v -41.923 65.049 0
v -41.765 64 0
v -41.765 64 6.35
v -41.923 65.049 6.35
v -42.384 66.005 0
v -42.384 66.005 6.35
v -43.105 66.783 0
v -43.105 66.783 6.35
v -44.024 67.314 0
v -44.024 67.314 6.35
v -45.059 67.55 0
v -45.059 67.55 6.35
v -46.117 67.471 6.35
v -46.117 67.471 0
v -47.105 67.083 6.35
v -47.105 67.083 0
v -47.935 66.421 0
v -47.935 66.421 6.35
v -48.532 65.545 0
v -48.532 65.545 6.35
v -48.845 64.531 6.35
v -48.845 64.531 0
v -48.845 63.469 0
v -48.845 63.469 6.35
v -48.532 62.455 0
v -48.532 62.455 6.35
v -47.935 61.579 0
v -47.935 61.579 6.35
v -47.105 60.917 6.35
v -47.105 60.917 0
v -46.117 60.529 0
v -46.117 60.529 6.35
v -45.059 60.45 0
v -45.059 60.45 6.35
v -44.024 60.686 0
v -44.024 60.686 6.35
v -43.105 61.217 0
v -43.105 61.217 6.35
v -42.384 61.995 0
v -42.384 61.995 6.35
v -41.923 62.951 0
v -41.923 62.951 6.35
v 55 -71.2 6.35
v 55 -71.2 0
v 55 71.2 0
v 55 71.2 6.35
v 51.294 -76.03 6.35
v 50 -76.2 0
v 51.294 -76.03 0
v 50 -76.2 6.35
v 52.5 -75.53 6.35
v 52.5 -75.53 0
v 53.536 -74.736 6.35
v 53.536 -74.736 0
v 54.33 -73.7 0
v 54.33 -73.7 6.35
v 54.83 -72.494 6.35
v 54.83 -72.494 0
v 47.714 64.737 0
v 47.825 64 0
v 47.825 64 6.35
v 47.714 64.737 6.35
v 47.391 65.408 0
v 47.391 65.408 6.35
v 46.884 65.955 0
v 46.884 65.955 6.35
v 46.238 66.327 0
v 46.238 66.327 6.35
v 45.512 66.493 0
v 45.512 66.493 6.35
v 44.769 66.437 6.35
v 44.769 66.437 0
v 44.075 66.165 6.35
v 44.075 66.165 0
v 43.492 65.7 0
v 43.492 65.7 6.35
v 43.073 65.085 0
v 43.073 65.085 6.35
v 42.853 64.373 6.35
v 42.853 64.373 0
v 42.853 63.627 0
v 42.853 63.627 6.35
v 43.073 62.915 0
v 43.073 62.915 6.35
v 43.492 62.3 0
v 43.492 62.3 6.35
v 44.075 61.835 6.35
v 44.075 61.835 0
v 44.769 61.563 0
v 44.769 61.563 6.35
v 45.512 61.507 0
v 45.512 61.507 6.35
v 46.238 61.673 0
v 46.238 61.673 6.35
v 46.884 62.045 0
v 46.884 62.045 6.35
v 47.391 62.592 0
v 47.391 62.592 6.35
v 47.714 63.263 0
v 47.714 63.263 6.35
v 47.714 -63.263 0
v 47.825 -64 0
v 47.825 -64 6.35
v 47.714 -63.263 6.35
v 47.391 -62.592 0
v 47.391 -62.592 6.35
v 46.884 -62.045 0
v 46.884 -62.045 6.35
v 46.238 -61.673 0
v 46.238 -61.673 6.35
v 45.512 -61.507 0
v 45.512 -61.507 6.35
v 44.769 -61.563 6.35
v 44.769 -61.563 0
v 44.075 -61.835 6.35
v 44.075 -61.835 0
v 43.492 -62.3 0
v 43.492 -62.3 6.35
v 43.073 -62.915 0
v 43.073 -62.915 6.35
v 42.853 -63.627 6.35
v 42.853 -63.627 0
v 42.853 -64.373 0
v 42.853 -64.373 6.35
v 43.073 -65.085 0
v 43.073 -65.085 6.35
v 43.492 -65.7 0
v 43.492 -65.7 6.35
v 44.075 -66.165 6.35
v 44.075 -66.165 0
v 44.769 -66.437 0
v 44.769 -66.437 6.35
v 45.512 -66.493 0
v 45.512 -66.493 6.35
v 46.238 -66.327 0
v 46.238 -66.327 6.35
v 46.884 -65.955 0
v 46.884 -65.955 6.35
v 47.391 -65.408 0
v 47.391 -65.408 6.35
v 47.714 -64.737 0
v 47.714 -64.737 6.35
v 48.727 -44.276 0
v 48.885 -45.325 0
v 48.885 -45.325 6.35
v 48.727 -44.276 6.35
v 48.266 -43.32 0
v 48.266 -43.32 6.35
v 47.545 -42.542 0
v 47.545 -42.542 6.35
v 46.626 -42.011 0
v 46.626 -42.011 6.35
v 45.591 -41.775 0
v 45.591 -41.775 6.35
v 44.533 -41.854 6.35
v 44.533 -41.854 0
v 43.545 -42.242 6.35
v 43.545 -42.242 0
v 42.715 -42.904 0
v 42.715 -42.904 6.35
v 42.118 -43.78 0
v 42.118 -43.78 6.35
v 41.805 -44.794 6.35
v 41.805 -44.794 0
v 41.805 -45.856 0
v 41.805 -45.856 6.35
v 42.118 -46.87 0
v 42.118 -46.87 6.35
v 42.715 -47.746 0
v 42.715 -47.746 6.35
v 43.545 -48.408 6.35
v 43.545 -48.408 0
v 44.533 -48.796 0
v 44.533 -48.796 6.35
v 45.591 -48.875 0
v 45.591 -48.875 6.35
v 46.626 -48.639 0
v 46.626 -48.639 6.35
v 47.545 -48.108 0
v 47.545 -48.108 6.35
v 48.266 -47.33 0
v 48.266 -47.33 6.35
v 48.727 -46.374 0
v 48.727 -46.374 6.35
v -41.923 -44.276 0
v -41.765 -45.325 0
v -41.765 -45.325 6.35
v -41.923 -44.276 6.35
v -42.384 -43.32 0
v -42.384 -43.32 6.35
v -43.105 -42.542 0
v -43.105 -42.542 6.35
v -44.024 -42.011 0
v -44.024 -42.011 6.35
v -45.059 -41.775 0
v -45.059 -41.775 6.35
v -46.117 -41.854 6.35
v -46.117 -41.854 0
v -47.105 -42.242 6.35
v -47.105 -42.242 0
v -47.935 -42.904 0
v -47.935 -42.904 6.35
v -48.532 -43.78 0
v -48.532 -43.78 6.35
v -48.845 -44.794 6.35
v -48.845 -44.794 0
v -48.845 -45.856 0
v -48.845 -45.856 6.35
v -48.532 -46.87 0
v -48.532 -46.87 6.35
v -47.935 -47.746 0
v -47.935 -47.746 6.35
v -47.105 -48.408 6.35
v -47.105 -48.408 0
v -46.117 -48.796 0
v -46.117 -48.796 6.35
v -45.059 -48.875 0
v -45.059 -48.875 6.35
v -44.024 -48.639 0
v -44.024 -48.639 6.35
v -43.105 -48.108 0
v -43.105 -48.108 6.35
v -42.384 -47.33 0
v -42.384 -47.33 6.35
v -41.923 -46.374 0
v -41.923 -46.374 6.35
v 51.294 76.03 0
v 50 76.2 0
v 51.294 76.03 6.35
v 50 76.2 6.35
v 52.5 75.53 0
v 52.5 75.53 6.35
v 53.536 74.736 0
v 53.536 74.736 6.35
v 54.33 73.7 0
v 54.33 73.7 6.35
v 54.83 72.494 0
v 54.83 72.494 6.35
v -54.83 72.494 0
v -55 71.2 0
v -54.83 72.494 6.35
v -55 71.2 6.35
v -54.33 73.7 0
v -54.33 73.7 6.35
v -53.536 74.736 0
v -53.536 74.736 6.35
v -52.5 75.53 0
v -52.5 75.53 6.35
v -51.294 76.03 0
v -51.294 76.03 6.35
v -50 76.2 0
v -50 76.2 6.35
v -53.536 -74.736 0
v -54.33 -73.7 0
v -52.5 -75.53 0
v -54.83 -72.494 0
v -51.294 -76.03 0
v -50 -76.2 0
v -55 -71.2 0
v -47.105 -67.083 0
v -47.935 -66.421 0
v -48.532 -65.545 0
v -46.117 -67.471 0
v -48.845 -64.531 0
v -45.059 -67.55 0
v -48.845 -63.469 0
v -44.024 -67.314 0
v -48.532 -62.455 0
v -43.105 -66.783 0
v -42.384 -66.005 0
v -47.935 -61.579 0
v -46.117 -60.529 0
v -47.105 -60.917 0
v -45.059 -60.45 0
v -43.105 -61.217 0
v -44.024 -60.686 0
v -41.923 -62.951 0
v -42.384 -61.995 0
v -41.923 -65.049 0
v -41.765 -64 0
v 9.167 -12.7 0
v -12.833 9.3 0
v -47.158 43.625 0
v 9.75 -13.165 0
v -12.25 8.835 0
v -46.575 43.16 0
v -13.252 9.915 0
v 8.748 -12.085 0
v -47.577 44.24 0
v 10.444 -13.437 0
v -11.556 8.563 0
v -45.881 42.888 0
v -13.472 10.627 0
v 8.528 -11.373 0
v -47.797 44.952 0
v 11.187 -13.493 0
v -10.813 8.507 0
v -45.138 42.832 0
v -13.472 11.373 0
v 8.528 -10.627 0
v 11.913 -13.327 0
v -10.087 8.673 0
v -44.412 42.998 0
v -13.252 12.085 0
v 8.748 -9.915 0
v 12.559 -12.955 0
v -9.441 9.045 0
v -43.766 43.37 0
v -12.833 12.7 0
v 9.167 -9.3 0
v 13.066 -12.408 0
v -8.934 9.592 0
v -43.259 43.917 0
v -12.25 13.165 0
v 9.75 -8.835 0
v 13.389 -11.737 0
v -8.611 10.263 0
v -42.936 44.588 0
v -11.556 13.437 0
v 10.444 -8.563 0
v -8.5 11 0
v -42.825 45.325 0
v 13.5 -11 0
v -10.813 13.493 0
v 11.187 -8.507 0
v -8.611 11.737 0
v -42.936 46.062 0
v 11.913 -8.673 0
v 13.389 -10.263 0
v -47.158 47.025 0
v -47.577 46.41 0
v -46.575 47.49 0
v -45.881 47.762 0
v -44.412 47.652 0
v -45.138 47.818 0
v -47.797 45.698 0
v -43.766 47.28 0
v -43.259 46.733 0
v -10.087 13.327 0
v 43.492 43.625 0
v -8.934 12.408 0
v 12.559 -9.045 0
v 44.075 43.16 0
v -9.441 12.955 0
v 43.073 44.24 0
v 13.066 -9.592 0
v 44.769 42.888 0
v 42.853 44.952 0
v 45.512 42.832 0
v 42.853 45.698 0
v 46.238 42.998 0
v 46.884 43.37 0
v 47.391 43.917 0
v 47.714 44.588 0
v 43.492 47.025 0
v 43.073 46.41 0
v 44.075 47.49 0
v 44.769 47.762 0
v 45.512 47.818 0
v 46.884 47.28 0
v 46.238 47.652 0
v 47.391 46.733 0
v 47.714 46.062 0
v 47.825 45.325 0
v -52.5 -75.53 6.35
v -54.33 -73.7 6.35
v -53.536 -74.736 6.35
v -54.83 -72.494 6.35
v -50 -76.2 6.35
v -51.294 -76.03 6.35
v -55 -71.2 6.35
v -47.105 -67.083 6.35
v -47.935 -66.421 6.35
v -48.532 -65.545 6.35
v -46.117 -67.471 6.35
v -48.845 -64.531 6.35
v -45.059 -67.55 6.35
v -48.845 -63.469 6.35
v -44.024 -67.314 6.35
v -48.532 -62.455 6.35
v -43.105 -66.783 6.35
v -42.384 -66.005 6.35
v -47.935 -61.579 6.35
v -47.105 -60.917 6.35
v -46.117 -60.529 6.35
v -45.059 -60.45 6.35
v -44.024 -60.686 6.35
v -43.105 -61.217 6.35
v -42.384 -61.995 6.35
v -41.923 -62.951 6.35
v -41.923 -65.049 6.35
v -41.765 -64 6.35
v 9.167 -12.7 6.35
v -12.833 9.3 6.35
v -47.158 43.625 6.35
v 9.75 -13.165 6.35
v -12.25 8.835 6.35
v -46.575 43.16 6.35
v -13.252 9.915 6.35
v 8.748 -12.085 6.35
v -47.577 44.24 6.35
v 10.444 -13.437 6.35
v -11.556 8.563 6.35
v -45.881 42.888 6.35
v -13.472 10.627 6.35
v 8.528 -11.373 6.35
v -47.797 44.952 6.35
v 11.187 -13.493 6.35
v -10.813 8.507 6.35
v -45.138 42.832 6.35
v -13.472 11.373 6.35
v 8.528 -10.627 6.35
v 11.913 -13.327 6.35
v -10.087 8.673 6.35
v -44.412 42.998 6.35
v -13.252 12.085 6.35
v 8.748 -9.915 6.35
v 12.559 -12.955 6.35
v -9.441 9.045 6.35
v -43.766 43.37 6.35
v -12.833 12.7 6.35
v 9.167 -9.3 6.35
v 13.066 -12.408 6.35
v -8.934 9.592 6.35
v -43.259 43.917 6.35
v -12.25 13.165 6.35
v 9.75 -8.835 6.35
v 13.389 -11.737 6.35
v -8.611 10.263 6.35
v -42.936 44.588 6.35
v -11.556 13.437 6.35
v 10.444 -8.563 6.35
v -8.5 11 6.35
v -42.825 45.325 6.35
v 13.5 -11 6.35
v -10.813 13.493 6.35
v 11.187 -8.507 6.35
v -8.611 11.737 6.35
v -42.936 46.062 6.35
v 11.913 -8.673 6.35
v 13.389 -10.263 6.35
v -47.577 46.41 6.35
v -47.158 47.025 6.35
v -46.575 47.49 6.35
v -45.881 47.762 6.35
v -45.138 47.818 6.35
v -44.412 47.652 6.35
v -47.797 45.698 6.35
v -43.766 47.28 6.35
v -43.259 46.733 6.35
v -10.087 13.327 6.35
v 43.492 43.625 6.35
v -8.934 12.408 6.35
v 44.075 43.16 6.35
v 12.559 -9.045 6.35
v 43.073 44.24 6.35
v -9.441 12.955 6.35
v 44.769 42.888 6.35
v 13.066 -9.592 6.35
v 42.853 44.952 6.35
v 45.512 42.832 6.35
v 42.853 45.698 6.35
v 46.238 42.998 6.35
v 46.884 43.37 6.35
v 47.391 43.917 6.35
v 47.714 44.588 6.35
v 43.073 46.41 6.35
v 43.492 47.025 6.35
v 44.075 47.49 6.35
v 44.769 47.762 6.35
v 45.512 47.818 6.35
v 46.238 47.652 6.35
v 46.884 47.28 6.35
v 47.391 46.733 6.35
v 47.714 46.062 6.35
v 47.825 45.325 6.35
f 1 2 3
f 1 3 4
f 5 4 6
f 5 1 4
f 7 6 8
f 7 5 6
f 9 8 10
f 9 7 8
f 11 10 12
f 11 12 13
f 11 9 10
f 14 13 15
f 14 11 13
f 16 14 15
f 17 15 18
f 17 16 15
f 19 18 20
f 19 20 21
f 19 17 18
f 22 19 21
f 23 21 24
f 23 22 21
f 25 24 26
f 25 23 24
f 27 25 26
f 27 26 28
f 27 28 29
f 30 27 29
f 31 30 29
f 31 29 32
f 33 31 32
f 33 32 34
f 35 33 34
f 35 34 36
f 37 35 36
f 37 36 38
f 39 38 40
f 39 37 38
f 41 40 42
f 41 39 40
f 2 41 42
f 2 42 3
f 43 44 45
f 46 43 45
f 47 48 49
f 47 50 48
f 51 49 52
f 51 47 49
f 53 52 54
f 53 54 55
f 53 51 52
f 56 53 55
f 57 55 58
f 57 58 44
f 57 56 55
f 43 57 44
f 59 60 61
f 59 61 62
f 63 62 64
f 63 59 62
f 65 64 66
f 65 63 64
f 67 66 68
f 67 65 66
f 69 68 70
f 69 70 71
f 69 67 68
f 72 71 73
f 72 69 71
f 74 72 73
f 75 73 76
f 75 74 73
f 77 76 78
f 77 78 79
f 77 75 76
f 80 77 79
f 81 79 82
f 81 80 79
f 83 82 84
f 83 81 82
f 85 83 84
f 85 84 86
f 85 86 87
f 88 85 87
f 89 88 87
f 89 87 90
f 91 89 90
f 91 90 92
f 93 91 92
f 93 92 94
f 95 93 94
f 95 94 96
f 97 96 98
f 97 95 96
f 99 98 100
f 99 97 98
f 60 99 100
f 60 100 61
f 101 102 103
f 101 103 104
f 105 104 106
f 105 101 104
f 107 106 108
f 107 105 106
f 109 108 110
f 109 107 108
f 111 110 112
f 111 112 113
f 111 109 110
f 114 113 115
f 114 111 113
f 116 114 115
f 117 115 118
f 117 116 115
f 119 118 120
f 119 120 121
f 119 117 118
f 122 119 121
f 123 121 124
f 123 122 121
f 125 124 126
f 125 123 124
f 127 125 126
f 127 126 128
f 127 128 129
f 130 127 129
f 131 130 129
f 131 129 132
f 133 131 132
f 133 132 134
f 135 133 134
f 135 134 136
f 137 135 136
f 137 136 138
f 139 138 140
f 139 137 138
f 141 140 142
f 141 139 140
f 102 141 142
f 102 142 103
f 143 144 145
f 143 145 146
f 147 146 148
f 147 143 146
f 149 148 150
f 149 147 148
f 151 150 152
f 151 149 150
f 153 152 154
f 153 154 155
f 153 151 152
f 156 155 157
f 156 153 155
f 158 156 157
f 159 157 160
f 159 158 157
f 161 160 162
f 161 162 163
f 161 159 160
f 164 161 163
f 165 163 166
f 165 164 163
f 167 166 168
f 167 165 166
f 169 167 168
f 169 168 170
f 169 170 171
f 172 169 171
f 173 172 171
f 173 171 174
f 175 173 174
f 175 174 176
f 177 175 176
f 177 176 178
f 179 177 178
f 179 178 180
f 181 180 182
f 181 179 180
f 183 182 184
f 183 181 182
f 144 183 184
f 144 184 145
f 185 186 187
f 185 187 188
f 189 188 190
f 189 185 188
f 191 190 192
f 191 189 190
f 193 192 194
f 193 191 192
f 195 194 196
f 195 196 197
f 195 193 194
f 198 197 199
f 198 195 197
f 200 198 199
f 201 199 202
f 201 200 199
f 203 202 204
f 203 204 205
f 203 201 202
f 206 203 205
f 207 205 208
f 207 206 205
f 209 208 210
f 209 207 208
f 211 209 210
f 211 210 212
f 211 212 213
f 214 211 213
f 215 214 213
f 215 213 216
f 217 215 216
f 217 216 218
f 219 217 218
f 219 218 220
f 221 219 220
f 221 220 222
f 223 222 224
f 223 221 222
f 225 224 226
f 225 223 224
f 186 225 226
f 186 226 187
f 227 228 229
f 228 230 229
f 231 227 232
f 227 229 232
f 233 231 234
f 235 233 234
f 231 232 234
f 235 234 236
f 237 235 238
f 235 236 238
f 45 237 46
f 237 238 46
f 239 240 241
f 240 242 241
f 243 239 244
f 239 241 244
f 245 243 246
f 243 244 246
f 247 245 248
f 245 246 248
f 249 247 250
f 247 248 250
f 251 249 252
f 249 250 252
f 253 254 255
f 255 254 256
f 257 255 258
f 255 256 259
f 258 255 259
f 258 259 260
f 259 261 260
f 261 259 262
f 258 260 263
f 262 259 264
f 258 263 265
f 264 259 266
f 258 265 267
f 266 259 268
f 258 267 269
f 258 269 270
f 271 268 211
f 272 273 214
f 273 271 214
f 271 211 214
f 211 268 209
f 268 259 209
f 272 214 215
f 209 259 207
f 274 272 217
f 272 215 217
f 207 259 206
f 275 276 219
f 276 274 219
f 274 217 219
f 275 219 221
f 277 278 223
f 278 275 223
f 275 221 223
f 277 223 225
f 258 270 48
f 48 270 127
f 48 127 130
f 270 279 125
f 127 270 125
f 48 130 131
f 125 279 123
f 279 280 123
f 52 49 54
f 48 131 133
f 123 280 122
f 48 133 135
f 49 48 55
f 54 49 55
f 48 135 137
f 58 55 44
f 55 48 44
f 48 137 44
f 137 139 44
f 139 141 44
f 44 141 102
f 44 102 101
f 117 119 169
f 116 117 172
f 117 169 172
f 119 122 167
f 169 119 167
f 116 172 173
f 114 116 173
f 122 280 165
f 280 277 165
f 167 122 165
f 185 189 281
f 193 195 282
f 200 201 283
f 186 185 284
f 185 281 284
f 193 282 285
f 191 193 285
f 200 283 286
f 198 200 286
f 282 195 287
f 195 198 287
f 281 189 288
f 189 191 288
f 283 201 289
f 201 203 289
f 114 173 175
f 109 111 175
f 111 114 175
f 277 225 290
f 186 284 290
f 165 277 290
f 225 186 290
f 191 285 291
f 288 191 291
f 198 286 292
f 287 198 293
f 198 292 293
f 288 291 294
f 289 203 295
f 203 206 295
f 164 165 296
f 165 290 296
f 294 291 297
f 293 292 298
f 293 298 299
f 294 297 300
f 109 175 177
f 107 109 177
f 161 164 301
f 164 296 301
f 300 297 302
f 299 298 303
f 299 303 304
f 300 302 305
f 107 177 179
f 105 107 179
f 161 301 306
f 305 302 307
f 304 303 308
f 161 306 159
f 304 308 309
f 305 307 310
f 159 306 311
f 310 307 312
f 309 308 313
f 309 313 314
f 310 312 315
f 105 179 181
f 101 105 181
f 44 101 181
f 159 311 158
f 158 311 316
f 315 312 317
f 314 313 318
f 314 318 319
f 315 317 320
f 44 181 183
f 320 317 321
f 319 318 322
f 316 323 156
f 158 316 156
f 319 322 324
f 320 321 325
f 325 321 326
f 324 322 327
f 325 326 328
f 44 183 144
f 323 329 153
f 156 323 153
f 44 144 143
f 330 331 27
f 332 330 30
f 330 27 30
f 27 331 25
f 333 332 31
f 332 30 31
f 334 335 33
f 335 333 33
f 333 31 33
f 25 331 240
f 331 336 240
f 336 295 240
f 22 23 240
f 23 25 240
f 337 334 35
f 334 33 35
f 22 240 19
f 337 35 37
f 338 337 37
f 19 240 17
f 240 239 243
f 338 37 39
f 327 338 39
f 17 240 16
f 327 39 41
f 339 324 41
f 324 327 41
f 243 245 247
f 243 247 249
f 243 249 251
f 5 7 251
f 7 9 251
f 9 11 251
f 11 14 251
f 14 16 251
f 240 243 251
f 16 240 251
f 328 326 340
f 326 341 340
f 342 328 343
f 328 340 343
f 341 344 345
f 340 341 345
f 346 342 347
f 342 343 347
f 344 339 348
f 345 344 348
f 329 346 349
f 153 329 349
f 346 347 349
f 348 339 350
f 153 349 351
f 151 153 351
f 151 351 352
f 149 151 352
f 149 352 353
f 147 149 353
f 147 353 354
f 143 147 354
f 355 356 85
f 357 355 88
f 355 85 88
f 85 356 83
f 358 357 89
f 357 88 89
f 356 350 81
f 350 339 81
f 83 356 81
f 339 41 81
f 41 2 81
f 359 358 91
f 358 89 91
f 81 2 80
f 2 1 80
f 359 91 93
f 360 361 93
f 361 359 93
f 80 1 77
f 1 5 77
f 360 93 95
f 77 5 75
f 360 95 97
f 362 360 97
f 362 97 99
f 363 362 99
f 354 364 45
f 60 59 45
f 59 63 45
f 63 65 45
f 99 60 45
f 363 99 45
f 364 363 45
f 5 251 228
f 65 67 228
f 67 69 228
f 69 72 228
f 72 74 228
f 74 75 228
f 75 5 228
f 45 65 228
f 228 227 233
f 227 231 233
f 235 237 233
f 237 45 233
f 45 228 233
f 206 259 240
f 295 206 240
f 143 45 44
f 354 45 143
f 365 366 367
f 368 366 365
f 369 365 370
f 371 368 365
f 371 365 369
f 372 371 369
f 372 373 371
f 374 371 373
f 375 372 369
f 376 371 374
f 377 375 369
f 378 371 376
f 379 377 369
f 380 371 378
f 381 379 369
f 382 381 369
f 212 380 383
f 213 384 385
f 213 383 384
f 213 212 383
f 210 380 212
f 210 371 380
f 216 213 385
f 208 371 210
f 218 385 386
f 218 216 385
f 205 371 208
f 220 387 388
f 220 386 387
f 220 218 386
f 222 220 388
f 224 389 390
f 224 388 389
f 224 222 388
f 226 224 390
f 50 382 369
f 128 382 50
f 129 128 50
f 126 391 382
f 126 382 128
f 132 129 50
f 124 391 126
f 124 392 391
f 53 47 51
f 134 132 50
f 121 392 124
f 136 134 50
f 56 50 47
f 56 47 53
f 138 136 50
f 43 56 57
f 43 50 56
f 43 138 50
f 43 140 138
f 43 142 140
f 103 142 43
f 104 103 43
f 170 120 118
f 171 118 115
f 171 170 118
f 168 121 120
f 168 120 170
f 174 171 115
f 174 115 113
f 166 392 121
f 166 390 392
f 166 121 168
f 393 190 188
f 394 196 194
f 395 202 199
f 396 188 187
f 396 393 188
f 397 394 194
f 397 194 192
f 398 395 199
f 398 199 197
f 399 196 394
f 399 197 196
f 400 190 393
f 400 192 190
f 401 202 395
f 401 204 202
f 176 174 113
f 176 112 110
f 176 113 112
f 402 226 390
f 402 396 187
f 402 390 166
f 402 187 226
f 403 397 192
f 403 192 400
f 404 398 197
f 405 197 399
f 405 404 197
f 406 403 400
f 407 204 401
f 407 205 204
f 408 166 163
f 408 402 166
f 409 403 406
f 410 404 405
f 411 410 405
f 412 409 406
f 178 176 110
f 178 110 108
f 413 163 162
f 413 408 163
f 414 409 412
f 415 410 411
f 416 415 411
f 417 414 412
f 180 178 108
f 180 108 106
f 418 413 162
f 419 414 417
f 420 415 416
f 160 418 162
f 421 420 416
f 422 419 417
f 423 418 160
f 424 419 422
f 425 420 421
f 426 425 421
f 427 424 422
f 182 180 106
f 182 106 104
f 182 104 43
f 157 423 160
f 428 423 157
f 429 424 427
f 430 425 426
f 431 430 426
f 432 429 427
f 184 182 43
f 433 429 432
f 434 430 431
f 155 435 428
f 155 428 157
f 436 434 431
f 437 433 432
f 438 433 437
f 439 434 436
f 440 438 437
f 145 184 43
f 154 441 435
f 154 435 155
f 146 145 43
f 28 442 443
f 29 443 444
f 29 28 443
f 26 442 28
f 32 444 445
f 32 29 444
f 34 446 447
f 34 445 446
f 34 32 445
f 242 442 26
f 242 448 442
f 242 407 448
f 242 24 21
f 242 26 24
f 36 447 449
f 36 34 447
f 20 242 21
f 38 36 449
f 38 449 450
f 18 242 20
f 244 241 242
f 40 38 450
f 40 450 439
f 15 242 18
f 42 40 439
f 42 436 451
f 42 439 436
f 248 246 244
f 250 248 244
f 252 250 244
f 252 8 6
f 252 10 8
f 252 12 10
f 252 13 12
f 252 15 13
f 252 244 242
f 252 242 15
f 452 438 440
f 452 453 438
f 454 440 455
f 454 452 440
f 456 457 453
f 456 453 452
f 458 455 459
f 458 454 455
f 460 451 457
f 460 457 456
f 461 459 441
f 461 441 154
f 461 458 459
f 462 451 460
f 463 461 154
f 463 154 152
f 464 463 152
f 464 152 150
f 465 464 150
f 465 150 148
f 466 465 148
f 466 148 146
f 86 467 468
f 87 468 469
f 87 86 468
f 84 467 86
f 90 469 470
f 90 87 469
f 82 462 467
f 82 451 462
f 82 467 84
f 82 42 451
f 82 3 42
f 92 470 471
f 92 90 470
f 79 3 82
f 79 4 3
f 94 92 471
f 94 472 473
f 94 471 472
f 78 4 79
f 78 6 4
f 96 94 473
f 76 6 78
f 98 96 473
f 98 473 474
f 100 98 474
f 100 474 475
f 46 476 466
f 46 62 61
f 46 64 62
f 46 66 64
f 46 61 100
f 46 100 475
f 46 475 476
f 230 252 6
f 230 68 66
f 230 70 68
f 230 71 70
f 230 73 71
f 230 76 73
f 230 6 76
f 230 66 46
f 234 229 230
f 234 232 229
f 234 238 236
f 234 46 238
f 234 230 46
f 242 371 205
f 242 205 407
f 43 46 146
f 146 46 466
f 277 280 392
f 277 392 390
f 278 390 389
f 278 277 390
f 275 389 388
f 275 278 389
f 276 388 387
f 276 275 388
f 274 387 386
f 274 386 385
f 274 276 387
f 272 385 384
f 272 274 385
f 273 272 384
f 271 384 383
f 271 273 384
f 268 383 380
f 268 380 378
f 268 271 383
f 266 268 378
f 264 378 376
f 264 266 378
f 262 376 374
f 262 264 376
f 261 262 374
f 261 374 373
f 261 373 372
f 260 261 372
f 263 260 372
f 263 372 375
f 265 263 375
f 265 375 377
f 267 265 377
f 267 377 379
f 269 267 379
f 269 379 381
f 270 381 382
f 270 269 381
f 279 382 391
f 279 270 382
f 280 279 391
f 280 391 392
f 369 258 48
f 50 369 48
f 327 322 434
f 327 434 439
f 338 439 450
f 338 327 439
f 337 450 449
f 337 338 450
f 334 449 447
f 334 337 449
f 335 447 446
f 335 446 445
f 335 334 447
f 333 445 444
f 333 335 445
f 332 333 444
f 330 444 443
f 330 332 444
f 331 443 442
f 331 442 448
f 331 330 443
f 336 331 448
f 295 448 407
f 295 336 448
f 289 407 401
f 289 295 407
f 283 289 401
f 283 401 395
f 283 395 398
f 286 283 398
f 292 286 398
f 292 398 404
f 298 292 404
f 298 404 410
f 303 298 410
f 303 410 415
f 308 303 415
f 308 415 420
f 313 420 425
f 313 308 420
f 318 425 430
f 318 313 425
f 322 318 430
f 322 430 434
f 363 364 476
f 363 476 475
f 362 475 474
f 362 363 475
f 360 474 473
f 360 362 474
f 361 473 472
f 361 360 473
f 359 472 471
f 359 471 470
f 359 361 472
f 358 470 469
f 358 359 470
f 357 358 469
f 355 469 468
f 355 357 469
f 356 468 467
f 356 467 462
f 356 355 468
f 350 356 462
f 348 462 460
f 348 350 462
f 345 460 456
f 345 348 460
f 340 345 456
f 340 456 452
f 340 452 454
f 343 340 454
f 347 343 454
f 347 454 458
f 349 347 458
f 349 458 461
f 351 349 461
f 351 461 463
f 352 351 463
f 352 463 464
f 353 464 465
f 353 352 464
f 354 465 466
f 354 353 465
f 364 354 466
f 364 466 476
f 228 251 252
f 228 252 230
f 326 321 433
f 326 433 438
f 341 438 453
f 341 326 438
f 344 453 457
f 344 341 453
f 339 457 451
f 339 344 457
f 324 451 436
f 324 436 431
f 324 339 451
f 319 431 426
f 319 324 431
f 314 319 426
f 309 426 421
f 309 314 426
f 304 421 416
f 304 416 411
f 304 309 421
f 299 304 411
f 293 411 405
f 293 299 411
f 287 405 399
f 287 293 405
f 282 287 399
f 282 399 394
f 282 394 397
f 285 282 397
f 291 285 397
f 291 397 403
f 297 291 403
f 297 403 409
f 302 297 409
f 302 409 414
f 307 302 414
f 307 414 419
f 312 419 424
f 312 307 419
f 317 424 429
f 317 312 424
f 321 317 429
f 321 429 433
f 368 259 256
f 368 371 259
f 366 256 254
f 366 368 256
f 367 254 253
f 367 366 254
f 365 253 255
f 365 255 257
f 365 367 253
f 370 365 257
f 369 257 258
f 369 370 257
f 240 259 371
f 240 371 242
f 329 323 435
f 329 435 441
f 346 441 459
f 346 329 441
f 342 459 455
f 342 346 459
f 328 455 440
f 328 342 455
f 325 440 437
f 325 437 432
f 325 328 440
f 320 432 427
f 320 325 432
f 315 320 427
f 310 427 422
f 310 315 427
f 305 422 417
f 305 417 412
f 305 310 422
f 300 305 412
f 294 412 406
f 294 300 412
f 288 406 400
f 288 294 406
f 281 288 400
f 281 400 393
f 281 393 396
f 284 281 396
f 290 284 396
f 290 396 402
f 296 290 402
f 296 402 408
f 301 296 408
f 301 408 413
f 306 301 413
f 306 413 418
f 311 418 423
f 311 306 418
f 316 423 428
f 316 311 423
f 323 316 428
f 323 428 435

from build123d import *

# Parameters (mm, degrees)
F0_W     = 110
F0_H     = 152.4
F0_R     = 3.56
F0_R_2   = 2.5
F1_DEPTH = 6.35
F2_R     = 5


# Not quite as in the source:
# - a length typed as a fraction of an inch, garbled in the dataset ("3 / 203.2 mm" for 3/8 in), is restored


with BuildPart() as f1:
    # F0 (on Top) → F1 (new body)
    with BuildSketch(Plane.XY):
        Rectangle(F0_W, F0_H)
        with Locations((-45.325, -64)):
            Circle(F0_R, mode=Mode.SUBTRACT)
        with Locations((-45.325, -45.325)):
            Circle(F0_R, mode=Mode.SUBTRACT)
        with Locations((45.325, -64)):
            Circle(F0_R_2, mode=Mode.SUBTRACT)
        with Locations((45.325, -45.325)):
            Circle(F0_R, mode=Mode.SUBTRACT)
        with Locations((11, -11)):
            Circle(F0_R_2, mode=Mode.SUBTRACT)
        with Locations((-11, 11)):
            Circle(F0_R_2, mode=Mode.SUBTRACT)
        with Locations((-45.325, 45.325)):
            Circle(F0_R_2, mode=Mode.SUBTRACT)
        with Locations((-45.325, 64)):
            Circle(F0_R, mode=Mode.SUBTRACT)
        with Locations((45.325, 45.325)):
            Circle(F0_R_2, mode=Mode.SUBTRACT)
        with Locations((45.325, 64)):
            Circle(F0_R_2, mode=Mode.SUBTRACT)
    extrude(amount=F1_DEPTH)

    # F2
    f2_edges = [f1.edges().sort_by_distance(p)[0] for p in [
        (-55, 76.2, 3.175),
        (55, 76.2, 3.175),
        (55, -76.2, 3.175),
        (-55, -76.2, 3.175),
    ]]
    fillet(f2_edges, radius=F2_R)


solid = f1.part
